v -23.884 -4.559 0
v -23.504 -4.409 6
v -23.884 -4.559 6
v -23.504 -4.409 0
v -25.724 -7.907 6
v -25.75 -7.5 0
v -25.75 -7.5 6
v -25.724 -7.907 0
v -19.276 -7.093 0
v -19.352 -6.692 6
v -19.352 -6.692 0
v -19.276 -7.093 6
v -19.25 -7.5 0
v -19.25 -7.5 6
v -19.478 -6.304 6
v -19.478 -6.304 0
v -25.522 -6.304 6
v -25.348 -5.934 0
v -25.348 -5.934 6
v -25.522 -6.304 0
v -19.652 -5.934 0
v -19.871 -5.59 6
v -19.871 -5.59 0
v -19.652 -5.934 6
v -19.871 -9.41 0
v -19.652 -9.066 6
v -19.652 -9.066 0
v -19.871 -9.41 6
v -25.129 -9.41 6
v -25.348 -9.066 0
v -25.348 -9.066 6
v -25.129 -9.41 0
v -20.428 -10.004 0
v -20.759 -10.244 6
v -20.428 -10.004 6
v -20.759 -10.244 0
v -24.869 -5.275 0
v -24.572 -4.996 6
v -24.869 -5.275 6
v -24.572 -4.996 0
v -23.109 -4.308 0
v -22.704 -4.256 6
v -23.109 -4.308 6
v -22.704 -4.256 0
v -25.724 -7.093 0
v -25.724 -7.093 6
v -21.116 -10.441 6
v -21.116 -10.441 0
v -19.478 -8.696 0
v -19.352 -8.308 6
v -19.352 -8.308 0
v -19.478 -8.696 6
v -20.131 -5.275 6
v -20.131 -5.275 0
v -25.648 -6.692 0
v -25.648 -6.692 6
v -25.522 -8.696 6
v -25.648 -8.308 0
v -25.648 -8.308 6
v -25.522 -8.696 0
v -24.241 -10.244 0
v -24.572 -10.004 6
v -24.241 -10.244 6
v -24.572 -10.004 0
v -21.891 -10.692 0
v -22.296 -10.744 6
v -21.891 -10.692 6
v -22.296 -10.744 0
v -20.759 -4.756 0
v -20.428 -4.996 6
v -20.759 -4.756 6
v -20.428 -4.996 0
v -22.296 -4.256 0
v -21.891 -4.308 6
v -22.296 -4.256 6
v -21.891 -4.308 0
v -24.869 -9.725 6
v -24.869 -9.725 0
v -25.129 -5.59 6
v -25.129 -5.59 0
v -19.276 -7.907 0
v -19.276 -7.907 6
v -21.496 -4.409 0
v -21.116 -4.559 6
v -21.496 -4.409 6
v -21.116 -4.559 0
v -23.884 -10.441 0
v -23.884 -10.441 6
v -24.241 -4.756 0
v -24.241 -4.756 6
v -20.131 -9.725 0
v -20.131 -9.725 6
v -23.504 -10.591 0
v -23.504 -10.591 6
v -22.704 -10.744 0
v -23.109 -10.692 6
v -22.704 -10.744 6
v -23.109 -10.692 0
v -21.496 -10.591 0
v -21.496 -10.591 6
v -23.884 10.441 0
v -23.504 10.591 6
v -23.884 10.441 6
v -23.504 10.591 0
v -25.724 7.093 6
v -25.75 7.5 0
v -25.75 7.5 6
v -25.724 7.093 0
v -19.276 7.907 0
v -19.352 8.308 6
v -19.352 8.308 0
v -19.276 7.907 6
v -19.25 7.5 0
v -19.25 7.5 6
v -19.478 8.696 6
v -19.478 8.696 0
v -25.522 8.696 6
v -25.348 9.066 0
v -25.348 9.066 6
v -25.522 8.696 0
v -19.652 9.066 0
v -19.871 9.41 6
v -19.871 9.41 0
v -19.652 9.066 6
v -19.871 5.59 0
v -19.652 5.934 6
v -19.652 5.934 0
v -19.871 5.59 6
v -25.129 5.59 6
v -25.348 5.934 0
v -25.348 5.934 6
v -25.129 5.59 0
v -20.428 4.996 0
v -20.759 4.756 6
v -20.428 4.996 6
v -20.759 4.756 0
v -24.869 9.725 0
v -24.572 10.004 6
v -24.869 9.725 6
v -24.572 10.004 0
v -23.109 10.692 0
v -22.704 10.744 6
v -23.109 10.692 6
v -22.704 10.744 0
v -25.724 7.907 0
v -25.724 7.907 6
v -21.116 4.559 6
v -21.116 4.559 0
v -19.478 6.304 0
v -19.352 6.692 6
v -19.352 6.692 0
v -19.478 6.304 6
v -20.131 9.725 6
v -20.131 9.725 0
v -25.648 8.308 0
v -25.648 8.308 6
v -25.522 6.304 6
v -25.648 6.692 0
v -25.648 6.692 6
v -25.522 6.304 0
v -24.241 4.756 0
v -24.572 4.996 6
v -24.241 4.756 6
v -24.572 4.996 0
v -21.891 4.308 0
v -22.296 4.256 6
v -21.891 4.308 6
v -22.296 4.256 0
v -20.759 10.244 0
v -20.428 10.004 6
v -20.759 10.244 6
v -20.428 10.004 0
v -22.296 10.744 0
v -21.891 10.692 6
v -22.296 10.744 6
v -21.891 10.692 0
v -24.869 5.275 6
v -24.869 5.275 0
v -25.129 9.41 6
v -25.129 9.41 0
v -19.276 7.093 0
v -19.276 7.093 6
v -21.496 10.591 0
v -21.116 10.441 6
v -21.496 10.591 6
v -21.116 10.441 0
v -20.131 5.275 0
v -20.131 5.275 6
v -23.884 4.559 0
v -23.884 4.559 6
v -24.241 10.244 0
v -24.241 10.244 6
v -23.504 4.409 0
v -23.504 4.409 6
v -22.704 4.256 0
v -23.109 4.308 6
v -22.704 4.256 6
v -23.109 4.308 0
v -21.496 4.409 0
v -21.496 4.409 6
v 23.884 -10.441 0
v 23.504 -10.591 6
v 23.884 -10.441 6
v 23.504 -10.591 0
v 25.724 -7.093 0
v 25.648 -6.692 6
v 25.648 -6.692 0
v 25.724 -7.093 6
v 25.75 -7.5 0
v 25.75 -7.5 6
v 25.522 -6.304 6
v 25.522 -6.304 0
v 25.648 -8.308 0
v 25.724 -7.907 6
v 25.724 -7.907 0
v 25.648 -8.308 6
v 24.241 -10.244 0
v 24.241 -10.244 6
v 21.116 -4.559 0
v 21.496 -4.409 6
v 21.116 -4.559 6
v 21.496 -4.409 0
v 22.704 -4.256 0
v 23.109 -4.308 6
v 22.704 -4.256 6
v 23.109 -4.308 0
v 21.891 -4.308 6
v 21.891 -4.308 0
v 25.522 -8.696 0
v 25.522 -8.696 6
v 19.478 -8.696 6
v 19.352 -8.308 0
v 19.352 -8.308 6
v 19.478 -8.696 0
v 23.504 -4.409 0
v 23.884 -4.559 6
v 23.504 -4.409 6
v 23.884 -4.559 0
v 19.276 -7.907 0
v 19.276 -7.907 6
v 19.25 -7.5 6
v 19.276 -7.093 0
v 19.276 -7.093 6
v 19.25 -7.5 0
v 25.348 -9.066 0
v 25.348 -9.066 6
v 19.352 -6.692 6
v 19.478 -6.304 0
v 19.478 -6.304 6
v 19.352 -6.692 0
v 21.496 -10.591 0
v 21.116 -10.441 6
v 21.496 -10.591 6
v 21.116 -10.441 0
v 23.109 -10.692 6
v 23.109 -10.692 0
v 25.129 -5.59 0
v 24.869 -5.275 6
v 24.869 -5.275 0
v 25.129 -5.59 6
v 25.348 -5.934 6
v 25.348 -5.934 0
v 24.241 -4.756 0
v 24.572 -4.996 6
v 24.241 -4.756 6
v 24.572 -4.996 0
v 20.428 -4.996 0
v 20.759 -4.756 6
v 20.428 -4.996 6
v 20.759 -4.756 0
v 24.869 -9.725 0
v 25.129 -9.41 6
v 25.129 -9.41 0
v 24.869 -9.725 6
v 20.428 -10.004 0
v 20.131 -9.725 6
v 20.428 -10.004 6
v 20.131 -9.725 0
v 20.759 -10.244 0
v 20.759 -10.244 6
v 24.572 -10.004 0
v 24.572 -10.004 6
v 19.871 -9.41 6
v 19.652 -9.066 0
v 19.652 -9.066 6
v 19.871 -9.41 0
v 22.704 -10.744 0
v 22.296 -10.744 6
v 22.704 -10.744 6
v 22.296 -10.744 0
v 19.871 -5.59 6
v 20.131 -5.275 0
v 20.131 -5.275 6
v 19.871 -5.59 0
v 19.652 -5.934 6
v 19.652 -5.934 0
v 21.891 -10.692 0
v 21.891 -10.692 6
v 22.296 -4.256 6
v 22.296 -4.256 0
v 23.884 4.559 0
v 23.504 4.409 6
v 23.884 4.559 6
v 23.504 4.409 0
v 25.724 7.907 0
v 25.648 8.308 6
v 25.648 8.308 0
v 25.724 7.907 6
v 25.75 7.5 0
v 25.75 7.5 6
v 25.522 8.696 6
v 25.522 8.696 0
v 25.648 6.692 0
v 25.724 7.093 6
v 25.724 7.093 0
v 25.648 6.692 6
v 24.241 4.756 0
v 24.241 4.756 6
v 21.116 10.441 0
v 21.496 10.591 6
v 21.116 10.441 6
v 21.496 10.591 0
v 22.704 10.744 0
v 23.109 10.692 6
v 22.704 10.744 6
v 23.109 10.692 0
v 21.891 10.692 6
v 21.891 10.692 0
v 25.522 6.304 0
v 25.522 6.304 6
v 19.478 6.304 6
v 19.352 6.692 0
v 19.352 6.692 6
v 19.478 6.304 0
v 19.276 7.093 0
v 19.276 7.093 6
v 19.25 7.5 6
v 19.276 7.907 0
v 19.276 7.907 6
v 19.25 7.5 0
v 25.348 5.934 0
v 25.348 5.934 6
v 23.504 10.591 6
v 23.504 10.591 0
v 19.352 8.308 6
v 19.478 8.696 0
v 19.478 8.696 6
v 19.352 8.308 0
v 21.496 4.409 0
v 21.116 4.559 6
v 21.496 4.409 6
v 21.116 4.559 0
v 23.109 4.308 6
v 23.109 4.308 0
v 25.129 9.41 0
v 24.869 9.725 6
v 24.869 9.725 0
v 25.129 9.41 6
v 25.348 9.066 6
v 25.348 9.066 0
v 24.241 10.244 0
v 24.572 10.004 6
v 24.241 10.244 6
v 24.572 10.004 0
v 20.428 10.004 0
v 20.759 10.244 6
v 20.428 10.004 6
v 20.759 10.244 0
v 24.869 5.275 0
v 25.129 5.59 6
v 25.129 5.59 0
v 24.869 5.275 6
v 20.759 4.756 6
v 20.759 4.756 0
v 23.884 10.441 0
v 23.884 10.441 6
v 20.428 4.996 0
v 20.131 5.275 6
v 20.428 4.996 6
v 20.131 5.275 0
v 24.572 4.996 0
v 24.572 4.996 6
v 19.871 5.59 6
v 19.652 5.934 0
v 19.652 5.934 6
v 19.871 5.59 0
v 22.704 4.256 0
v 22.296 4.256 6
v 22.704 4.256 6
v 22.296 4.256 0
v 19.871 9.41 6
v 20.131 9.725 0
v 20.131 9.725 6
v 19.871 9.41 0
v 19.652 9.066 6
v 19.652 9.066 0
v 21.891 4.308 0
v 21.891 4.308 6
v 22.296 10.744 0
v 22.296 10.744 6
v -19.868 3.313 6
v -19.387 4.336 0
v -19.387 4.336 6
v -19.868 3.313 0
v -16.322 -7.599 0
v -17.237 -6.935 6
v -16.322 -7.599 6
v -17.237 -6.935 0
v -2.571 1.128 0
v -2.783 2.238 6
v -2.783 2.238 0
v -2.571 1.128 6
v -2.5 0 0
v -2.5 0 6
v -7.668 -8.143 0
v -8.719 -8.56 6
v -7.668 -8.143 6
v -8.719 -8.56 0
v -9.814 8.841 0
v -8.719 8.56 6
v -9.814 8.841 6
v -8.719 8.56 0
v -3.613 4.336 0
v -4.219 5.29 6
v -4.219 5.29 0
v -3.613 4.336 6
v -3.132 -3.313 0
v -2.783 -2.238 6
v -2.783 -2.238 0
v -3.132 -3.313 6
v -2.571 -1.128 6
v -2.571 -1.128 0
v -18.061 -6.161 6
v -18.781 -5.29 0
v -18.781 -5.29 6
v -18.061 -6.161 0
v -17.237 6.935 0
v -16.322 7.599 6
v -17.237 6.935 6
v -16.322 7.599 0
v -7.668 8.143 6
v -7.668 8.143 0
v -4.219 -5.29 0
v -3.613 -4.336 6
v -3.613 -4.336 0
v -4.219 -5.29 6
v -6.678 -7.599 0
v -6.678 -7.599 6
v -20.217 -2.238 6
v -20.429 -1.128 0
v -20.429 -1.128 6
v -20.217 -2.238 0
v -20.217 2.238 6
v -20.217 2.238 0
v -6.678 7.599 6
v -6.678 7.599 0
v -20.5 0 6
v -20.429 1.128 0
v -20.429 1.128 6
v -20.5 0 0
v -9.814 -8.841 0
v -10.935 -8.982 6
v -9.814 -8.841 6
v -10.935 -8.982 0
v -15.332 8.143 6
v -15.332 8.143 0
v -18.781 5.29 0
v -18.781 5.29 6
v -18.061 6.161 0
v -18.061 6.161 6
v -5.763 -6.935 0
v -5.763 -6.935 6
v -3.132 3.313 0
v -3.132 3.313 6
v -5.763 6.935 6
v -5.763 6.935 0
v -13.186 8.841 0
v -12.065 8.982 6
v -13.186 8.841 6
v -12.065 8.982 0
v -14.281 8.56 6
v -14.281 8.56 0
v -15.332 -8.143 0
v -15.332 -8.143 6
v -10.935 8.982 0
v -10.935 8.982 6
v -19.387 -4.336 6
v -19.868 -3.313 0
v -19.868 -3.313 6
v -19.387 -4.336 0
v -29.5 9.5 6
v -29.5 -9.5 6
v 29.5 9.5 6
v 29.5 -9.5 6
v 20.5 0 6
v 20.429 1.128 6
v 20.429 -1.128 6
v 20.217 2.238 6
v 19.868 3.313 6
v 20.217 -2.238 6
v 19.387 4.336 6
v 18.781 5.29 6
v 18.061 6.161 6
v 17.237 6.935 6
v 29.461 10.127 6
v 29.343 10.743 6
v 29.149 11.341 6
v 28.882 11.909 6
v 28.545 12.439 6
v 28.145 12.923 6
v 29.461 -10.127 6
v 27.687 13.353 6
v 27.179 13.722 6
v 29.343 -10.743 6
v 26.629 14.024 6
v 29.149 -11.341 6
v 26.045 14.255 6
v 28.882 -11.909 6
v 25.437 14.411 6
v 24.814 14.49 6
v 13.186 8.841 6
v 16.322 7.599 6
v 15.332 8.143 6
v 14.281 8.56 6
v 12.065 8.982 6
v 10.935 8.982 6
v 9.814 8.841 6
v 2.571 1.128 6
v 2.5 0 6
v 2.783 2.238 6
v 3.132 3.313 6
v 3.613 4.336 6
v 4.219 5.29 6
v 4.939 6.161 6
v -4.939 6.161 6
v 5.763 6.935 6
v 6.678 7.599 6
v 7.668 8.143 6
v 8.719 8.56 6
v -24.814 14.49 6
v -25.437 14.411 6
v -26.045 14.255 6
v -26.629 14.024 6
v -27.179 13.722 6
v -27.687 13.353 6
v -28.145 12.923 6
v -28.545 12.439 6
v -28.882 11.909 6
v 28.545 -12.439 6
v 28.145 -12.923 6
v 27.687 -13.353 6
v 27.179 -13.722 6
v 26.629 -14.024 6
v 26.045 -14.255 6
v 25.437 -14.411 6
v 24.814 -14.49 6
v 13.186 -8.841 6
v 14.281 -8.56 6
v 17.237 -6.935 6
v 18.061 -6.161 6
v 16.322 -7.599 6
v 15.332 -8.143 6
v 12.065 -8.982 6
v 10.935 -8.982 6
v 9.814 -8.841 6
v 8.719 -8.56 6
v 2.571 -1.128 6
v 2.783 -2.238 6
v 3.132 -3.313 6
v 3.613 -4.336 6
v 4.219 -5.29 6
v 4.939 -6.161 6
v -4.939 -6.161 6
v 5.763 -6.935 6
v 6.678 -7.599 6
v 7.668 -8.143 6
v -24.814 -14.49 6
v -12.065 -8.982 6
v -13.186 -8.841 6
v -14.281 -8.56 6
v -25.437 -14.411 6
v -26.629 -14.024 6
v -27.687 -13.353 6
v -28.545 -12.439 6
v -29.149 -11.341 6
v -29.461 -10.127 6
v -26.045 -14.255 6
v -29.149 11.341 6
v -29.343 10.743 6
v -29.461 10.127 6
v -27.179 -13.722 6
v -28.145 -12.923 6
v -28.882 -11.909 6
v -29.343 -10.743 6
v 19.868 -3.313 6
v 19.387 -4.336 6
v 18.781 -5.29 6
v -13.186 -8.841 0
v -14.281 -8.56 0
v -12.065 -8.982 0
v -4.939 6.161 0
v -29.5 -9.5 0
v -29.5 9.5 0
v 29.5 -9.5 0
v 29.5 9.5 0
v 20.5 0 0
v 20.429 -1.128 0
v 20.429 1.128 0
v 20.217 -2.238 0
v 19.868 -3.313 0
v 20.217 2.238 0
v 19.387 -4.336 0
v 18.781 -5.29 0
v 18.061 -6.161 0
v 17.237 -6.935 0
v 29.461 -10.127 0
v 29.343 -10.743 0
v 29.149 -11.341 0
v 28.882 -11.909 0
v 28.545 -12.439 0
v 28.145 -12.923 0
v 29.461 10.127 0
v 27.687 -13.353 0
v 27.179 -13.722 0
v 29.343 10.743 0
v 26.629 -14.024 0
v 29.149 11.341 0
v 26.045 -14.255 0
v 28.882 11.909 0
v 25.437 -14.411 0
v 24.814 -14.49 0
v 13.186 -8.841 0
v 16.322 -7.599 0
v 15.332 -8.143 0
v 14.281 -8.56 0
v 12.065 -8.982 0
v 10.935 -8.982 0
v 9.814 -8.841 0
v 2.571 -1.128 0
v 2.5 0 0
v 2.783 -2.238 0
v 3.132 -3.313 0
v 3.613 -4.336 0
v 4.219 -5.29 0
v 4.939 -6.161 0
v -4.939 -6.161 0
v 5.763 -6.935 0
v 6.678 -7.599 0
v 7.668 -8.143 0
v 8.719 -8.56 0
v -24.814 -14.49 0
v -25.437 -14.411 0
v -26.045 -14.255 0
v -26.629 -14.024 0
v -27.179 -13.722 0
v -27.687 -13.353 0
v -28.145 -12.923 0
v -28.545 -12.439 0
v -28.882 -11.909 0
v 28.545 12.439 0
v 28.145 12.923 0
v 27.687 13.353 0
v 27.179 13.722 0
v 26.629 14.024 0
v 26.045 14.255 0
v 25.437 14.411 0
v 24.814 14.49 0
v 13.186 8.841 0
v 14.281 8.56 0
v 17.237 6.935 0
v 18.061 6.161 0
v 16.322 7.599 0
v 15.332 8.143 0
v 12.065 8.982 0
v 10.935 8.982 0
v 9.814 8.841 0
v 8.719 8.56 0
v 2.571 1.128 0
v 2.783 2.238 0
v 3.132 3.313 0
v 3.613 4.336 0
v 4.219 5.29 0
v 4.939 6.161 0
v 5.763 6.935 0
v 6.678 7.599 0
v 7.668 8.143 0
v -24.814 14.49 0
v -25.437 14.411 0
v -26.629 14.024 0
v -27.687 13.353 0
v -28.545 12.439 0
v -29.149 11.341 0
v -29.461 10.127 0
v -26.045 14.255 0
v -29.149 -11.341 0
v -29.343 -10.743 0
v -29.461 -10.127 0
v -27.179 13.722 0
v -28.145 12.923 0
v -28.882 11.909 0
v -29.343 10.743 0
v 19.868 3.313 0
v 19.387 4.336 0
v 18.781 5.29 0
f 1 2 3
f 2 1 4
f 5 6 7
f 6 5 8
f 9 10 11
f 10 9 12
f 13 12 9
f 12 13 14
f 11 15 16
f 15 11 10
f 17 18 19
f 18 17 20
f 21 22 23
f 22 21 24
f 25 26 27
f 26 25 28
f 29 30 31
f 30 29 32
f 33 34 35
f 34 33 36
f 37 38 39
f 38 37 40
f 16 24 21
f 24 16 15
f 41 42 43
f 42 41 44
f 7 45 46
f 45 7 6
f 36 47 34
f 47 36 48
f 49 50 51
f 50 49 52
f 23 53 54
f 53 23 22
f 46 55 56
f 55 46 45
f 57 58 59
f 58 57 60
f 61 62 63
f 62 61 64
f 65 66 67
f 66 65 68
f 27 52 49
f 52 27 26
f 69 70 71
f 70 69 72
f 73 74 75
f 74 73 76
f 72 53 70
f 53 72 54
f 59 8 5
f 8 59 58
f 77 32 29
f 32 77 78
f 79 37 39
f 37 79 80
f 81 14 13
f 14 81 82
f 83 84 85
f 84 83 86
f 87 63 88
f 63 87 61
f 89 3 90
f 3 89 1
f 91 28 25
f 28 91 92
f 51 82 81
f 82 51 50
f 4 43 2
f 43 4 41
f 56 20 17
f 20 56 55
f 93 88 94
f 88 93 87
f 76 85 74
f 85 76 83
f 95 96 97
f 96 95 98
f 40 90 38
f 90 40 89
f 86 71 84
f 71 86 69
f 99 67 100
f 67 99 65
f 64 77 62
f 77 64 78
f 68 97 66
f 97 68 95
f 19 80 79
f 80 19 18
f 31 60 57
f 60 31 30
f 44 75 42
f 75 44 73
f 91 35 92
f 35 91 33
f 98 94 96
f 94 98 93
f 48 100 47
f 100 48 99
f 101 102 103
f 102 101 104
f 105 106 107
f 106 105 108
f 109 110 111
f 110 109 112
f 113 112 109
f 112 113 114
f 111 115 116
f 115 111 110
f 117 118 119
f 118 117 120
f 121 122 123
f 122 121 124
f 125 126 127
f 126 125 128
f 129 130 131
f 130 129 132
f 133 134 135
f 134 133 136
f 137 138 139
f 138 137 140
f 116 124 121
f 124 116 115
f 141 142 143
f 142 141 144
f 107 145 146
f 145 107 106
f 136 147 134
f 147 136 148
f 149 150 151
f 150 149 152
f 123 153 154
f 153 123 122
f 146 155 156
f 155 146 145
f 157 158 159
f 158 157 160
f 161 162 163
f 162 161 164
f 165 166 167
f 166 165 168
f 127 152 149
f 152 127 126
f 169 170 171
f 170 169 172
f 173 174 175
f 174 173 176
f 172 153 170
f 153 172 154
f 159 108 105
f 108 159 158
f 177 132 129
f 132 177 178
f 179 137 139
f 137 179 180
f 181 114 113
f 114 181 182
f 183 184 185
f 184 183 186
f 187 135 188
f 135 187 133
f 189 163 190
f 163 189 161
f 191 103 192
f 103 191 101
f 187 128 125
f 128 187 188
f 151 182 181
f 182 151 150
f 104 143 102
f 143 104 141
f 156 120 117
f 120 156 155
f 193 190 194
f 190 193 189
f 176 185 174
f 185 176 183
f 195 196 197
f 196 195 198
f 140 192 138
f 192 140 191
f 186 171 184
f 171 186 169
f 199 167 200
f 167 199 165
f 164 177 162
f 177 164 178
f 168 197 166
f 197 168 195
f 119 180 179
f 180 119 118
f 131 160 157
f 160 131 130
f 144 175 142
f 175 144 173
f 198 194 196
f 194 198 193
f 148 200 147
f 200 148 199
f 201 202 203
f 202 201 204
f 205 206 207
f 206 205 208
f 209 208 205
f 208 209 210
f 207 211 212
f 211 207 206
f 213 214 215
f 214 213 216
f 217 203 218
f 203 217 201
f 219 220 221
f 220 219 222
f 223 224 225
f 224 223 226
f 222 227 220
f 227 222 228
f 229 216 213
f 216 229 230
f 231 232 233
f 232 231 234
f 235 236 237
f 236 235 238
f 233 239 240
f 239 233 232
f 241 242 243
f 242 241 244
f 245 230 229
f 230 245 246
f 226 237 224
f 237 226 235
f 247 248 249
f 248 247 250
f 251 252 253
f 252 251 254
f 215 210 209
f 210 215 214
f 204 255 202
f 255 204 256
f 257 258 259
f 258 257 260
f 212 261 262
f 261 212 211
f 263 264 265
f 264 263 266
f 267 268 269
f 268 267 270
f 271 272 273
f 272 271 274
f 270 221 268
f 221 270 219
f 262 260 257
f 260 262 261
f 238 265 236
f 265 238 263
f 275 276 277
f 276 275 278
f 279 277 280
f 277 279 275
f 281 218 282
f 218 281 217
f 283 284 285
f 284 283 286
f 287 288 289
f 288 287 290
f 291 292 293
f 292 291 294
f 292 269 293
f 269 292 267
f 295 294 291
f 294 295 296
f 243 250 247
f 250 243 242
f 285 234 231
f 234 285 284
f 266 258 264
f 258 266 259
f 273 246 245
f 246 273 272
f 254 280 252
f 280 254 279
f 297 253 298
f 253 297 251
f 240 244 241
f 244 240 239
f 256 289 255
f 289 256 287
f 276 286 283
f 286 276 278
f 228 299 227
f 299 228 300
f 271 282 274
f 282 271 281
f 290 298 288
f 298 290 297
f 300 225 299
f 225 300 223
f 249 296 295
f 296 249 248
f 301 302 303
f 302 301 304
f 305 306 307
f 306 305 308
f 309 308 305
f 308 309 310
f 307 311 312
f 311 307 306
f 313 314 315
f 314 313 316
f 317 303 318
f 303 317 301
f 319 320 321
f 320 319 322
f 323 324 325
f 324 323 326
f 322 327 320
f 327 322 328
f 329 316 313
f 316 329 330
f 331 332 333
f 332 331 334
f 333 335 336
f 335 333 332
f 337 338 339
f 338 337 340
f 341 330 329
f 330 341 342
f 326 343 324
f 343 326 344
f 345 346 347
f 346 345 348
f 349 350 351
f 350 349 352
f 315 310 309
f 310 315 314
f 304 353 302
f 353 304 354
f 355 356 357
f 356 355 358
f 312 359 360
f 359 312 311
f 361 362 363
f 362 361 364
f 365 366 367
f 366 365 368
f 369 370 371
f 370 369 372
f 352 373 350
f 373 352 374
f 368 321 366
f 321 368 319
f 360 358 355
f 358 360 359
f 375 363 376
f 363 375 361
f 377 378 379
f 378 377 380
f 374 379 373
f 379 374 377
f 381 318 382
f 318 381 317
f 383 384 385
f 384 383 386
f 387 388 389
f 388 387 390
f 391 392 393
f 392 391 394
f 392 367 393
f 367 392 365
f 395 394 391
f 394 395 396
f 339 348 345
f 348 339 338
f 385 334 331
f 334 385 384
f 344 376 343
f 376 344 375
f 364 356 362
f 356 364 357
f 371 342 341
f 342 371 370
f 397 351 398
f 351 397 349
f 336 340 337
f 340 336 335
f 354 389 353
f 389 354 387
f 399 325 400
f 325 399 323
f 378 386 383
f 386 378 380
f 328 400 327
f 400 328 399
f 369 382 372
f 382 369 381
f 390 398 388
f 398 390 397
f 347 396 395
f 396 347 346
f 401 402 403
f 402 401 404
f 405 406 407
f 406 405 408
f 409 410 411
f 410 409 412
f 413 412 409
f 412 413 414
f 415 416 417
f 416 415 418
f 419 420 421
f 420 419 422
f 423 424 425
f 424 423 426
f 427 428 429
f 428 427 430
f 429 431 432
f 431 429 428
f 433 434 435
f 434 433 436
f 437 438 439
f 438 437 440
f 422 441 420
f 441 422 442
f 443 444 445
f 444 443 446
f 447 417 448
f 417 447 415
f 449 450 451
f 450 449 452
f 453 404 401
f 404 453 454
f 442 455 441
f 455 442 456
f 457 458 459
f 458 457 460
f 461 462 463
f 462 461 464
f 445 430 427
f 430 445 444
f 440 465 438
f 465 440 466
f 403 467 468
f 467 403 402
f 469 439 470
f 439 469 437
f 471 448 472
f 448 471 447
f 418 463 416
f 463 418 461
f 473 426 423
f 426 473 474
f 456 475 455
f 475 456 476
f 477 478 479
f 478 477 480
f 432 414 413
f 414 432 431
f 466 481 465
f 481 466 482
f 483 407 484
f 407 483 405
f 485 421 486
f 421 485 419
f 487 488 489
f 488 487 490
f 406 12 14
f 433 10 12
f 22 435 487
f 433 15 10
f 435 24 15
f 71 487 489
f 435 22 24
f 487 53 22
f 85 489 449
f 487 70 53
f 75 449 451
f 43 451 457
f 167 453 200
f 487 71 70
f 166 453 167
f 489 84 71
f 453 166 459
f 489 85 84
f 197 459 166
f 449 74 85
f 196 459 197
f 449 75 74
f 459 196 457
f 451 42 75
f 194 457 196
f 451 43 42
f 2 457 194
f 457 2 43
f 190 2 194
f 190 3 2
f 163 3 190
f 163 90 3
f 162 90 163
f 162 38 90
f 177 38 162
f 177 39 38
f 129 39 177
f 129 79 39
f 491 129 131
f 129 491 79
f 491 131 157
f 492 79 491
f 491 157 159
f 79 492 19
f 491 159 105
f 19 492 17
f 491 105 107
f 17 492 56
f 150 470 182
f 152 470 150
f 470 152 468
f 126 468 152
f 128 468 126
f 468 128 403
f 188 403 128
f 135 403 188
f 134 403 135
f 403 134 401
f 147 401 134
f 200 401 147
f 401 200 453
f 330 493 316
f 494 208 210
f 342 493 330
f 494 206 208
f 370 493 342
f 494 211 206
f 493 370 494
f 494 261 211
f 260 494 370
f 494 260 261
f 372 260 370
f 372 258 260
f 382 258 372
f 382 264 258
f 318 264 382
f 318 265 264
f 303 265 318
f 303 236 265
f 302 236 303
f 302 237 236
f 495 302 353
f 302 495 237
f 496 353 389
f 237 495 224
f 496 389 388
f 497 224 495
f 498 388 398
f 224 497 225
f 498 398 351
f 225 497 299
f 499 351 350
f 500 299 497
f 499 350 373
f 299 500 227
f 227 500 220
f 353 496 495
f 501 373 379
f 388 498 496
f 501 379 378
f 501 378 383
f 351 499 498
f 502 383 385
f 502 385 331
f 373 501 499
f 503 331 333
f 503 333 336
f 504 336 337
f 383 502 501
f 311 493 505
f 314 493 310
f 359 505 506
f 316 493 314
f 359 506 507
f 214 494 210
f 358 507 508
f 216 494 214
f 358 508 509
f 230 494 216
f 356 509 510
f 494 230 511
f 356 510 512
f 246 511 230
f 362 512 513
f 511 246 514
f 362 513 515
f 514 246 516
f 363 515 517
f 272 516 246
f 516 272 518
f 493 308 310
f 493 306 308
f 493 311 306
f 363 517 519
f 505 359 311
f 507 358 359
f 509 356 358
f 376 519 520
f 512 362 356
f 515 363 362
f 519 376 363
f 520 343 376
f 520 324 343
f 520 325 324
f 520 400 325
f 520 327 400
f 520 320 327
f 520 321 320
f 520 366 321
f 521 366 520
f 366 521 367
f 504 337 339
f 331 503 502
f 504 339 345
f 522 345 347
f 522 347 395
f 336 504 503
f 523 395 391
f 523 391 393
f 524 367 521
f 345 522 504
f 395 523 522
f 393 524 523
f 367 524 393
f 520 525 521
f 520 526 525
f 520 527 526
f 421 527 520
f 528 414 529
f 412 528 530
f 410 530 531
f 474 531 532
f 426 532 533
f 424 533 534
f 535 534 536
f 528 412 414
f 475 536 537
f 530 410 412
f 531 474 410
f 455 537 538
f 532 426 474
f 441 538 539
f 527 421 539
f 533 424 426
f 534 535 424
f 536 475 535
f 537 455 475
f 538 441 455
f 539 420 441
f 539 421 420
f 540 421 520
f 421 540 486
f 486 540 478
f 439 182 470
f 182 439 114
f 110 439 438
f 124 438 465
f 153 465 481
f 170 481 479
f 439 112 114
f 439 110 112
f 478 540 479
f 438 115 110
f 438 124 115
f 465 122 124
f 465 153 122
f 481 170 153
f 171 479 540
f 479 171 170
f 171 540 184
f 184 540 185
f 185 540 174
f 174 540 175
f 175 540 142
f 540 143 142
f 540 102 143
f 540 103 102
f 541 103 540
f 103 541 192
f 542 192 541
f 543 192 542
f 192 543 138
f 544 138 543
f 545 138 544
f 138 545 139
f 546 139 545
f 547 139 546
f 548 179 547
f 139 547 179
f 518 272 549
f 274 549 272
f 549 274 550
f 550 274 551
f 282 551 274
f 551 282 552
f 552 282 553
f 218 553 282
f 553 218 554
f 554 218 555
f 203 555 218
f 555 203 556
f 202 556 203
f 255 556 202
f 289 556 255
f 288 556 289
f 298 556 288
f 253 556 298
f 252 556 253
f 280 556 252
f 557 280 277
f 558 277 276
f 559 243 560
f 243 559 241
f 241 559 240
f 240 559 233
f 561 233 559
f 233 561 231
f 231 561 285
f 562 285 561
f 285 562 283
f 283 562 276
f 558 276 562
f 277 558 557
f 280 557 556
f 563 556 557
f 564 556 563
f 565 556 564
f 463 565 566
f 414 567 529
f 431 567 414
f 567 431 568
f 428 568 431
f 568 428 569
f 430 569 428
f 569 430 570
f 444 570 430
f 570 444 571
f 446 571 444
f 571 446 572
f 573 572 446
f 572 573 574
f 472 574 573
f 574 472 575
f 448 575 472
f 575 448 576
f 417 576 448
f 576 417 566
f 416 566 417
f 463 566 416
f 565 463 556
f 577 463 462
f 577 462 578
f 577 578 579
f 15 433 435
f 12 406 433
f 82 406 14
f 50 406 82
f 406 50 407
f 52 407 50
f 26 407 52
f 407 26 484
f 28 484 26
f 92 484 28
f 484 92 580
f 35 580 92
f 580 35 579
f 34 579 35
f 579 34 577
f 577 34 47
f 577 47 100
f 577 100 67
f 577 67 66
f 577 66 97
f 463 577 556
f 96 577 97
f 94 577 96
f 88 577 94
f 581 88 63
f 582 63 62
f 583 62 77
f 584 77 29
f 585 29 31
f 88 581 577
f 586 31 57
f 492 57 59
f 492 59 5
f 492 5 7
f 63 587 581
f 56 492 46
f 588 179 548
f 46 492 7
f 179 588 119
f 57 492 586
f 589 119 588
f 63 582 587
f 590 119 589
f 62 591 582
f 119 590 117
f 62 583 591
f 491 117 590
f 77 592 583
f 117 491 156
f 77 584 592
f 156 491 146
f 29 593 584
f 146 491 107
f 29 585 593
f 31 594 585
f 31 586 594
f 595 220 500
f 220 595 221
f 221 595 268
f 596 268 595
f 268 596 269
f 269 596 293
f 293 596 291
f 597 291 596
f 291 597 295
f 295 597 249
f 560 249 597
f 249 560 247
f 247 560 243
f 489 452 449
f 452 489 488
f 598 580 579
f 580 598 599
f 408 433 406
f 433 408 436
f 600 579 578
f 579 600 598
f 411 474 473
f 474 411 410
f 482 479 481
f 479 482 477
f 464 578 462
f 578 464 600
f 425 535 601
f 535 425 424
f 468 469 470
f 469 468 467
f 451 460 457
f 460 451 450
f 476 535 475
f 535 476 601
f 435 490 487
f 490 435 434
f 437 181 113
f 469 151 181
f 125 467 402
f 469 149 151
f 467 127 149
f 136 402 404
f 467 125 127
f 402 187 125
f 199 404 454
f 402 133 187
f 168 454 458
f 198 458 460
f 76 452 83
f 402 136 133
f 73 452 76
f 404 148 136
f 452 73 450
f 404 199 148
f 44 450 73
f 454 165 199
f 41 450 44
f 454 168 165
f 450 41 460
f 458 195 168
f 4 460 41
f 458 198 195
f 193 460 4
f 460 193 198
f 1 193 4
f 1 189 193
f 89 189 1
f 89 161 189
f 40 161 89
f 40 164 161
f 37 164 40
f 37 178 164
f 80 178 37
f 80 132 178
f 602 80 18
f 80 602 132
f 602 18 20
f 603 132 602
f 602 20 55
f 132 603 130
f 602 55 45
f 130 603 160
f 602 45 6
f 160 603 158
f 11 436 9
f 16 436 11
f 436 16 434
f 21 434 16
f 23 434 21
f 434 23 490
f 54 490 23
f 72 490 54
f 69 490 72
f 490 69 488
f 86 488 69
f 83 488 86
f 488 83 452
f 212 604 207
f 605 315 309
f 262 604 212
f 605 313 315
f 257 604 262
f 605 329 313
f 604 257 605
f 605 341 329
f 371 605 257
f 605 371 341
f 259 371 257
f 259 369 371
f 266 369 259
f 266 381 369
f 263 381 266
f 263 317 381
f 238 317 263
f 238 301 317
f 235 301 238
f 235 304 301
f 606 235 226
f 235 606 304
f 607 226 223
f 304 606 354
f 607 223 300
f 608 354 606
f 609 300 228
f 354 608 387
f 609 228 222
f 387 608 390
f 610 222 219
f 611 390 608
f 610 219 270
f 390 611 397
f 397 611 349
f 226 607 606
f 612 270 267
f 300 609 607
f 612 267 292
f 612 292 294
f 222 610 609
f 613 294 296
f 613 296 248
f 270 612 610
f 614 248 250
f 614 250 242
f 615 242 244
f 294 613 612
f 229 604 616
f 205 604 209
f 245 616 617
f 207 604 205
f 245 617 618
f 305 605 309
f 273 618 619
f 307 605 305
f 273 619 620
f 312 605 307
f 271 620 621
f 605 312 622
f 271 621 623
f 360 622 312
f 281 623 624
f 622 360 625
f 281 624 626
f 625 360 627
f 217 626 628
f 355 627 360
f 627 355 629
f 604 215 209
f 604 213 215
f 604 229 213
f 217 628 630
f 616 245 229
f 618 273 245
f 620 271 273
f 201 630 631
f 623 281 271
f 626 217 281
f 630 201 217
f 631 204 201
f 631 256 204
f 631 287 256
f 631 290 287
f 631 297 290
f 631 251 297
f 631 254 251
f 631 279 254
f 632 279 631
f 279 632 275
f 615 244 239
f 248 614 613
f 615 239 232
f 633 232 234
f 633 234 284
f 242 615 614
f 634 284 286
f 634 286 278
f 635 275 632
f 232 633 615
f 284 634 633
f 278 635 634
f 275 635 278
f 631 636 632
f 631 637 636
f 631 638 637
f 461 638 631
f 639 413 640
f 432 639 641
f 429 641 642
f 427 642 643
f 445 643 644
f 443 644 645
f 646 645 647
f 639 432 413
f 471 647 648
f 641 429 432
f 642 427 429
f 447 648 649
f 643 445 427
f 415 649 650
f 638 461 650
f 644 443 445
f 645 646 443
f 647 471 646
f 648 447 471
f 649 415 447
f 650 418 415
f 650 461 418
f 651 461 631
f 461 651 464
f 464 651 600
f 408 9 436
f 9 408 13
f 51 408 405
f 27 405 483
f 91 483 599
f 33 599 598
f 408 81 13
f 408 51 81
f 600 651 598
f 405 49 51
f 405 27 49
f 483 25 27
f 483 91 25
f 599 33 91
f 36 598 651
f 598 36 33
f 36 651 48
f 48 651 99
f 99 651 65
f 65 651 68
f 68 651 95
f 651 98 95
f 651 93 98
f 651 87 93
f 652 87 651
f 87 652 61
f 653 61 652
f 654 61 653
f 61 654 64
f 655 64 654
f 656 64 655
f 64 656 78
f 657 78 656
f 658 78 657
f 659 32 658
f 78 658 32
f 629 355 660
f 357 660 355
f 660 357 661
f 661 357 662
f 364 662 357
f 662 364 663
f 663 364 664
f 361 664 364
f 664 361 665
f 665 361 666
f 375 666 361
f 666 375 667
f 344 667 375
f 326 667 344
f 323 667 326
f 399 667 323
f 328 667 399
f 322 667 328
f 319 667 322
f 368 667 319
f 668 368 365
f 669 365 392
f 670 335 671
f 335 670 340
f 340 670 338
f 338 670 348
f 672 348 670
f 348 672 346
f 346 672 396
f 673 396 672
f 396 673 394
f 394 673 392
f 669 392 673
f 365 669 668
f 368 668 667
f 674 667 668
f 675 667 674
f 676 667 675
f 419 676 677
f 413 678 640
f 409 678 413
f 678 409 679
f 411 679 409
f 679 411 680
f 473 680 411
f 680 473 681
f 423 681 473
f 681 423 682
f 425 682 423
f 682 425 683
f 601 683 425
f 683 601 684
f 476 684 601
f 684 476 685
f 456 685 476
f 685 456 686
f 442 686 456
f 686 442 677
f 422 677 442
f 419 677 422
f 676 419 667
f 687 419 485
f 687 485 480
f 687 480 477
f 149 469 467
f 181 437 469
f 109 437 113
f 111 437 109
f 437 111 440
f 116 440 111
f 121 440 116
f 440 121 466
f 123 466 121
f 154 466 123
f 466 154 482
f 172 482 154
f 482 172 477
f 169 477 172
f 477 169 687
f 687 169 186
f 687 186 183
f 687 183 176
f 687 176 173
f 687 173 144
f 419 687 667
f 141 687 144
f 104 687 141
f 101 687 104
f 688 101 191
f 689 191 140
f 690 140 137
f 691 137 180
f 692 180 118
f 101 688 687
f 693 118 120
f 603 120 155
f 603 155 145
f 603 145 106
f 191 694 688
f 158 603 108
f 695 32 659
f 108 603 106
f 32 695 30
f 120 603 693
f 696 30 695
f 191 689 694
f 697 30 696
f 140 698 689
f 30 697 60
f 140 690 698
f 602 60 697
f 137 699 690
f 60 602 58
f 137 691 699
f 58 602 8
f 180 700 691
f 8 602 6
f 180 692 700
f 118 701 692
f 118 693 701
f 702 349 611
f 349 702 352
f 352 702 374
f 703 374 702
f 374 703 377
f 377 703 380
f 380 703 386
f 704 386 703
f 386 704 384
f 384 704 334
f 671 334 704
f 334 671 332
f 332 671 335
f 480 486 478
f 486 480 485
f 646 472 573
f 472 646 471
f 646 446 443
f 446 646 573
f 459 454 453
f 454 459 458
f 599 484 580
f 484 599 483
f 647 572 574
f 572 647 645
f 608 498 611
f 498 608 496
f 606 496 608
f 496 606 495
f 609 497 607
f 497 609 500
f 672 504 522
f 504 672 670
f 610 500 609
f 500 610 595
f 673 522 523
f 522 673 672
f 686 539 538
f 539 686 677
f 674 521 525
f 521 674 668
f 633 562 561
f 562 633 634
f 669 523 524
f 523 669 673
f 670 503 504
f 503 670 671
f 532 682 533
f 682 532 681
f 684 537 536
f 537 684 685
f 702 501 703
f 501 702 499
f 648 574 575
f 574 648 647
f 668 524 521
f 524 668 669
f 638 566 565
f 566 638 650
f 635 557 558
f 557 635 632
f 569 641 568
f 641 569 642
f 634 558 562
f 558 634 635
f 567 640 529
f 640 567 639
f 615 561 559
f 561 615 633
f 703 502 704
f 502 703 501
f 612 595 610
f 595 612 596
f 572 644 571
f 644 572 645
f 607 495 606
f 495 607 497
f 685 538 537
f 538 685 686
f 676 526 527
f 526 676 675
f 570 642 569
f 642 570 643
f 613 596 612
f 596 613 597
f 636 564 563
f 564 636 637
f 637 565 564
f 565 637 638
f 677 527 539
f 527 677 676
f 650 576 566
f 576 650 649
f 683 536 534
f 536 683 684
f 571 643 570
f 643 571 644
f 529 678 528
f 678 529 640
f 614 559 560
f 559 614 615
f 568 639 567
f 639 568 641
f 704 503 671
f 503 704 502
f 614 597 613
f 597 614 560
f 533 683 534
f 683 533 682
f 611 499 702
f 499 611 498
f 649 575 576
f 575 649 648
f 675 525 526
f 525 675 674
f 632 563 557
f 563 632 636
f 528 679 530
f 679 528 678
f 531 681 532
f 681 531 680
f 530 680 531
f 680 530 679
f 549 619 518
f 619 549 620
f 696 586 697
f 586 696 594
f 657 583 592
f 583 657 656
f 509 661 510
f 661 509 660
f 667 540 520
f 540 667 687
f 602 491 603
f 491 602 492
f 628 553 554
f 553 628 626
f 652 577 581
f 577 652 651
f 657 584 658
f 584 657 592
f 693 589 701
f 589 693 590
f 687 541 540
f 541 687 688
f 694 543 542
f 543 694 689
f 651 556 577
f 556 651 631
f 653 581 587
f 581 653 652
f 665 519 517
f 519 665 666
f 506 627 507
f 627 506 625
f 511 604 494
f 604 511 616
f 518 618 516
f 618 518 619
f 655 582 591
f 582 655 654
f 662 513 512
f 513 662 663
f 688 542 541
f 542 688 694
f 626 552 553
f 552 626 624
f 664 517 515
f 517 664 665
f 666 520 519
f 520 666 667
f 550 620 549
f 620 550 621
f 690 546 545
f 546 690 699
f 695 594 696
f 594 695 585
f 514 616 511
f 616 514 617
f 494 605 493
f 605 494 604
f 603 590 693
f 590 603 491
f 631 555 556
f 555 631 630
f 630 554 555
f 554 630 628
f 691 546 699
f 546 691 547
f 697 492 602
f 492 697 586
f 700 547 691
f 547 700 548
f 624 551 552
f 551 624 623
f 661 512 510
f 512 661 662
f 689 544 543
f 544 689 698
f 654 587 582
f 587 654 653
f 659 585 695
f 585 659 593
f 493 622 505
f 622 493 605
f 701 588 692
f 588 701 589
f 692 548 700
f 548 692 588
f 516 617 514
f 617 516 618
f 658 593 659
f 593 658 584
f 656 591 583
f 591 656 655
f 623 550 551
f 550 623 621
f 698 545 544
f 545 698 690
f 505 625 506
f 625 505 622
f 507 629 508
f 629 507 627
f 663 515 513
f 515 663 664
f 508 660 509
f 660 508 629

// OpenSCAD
$fn = 50;

difference() {
	union() {
		hull() {
			translate(v = [-24.5, 9.5, 0]) {
				cylinder(h = 6, r = 5);
			}
			translate(v = [24.5, 9.5, 0]) {
				cylinder(h = 6, r = 5);
			}
			translate(v = [-24.5, -9.5, 0]) {
				cylinder(h = 6, r = 5);
			}
			translate(v = [24.5, -9.5, 0]) {
				cylinder(h = 6, r = 5);
			}
		}
	}
	union() {
		translate(v = [-22.5, -7.5, -100.0]) {
			cylinder(h = 200, r = 3.25);
		}
		translate(v = [-22.5, 7.5, -100.0]) {
			cylinder(h = 200, r = 3.25);
		}
		translate(v = [22.5, -7.5, -100.0]) {
			cylinder(h = 200, r = 3.25);
		}
		translate(v = [22.5, 7.5, -100.0]) {
			cylinder(h = 200, r = 3.25);
		}
		translate(v = [-22.5, -7.5, -100.0]) {
			cylinder(h = 200, r = 1.8);
		}
		translate(v = [-22.5, 7.5, -100.0]) {
			cylinder(h = 200, r = 1.8);
		}
		translate(v = [22.5, -7.5, -100.0]) {
			cylinder(h = 200, r = 1.8);
		}
		translate(v = [22.5, 7.5, -100.0]) {
			cylinder(h = 200, r = 1.8);
		}
		translate(v = [-11.5, 0, 0.0]) {
			cylinder(h = 6, r = 9.0);
		}
		translate(v = [11.5, 0, 0.0]) {
			cylinder(h = 6, r = 9.0);
		}
	}
}
